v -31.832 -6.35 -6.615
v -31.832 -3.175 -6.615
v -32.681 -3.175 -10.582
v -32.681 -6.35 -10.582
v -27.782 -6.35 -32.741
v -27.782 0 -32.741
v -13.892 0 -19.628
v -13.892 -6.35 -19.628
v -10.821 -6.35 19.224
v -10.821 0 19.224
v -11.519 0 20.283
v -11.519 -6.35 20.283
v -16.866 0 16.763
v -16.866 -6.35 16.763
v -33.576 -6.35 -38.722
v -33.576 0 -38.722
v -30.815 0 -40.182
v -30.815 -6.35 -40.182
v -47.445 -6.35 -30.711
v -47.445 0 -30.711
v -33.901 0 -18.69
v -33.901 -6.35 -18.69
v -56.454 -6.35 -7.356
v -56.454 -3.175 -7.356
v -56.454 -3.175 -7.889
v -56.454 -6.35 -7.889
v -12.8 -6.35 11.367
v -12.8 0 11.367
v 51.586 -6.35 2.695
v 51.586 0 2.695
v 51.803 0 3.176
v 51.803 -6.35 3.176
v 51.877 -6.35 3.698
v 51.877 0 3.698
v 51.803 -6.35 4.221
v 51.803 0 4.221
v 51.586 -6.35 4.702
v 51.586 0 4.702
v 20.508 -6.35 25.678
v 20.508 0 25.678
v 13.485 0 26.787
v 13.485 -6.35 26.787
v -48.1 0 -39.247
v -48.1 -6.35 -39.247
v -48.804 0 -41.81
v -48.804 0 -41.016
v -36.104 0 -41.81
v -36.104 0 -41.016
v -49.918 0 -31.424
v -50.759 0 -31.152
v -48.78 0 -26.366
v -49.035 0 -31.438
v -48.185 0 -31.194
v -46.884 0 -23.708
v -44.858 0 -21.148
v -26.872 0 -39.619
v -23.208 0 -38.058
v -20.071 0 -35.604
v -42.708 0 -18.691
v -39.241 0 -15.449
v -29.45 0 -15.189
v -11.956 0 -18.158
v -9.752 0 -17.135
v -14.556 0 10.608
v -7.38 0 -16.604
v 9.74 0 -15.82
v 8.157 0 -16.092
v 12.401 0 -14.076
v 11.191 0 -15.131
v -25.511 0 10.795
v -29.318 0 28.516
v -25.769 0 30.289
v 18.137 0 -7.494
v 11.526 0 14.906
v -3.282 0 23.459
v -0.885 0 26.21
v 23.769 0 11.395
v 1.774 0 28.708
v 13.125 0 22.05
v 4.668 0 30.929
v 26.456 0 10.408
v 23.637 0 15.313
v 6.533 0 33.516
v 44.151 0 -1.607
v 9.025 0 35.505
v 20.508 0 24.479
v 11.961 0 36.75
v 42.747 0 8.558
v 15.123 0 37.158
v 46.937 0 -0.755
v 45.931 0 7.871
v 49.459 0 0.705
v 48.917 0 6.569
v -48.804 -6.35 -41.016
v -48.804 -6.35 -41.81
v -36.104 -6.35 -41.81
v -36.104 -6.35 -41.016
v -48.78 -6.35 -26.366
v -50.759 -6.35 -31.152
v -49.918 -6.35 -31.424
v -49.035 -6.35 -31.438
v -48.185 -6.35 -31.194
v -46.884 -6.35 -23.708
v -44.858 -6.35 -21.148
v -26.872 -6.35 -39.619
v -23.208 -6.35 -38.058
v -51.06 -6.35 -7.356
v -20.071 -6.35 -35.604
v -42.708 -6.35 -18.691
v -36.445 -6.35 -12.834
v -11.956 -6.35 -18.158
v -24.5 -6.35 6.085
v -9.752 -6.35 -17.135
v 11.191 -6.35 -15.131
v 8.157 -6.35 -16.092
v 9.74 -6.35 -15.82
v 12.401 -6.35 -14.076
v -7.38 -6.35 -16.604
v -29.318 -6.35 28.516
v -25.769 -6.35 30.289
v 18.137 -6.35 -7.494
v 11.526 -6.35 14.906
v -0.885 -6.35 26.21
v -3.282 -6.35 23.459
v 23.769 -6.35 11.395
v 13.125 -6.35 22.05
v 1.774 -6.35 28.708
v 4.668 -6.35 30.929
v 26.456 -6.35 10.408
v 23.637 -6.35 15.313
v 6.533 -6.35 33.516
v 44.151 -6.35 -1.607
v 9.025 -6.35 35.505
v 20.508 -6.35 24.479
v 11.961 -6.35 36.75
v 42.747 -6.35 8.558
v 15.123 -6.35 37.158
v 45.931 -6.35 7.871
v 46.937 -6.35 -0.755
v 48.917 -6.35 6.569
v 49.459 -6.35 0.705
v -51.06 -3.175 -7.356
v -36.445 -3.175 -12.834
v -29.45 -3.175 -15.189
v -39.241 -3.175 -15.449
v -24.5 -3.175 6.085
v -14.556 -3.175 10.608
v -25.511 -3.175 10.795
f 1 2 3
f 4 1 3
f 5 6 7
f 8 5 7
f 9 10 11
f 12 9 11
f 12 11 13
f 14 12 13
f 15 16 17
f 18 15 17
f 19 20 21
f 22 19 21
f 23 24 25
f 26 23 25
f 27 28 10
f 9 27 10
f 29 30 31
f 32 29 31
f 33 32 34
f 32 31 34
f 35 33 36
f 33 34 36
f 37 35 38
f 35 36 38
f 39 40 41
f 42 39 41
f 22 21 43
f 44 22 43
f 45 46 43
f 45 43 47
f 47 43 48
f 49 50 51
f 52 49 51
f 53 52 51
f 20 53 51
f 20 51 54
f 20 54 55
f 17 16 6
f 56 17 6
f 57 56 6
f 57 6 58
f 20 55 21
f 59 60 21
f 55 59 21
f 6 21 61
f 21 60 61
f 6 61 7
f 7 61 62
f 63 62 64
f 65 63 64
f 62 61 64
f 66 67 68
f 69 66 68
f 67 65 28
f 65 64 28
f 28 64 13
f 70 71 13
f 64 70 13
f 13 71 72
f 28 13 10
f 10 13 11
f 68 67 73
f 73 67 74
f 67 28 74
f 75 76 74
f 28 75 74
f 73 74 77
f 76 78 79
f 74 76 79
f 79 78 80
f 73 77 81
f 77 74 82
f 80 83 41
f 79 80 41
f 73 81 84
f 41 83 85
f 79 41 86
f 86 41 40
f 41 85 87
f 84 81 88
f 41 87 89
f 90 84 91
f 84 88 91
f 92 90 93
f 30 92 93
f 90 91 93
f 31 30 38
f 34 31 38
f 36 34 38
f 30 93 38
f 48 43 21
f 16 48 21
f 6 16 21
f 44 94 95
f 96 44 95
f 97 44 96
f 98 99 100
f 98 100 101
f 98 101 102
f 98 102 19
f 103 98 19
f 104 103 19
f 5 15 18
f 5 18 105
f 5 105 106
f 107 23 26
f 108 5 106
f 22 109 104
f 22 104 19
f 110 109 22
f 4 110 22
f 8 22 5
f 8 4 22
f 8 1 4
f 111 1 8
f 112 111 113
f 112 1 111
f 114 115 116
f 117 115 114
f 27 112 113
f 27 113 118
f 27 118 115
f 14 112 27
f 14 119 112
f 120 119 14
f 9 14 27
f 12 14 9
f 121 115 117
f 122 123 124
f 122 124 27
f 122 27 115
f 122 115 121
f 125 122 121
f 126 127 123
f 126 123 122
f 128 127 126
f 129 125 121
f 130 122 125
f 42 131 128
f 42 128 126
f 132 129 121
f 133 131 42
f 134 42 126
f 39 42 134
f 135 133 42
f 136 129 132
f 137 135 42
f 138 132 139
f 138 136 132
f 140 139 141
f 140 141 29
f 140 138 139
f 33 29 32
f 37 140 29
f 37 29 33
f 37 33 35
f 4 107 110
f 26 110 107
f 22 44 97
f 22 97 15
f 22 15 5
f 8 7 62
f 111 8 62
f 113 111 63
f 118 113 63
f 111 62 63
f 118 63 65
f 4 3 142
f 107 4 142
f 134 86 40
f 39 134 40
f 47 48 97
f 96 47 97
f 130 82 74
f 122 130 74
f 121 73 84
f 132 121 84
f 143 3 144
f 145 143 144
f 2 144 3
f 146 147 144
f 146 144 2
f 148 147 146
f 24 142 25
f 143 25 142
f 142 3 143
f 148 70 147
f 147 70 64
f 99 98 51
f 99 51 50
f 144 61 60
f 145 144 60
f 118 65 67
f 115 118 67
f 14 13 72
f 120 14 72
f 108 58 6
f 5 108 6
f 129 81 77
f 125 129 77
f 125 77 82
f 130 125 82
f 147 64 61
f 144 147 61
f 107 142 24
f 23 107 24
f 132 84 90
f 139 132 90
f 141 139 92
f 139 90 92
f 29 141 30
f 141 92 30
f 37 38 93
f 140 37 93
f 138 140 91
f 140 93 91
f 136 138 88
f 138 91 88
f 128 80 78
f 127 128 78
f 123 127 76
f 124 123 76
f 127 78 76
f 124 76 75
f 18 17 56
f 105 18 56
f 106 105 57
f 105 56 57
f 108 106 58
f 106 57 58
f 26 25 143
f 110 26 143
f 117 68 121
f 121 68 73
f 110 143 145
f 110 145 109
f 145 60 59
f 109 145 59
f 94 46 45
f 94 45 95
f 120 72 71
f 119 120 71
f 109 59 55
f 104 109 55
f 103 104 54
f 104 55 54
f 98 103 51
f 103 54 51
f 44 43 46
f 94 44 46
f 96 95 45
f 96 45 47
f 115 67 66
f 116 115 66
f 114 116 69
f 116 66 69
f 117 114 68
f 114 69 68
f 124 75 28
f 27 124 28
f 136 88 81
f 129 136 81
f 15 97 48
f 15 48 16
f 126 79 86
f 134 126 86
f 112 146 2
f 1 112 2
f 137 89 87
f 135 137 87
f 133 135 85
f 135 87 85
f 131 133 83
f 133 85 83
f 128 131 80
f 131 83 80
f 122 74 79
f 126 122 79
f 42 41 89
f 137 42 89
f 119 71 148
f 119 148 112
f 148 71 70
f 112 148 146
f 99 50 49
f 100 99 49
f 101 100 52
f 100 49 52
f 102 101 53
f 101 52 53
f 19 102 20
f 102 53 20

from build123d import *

# Parameters (mm, degrees)
F1_DEPTH = 6.35
F3_DEPTH = 6.351
F5_DEPTH = 3.175
F6_W     = 12.7
F6_H     = 6.35
F7_DEPTH = 0.79375


with BuildPart() as f1:
    # F0 (on Front) → F1 (new body)
    with BuildSketch(Plane.XZ):
        with BuildLine():
            Line((-24.499685, 6.084885), (-31.832033, -6.615115))
            Line((-31.832033, -6.615115), (-32.680925, -10.581826))
            Line((-32.680925, -10.581826), (-51.059928, -7.35622))
            Line((-51.059928, -7.35622), (-56.454085, -7.35622))
            Line((-56.454085, -7.35622), (-56.454085, -7.889269))
            Line((-56.454085, -7.889269), (-36.444739, -12.834284))
            Line((-36.444739, -12.834284), (-42.707812, -18.690551))
            ThreePointArc((-42.707812, -18.690551), (-45.886659, -22.415252), (-48.779547, -26.366159))
            Line((-48.779547, -26.366159), (-50.759438, -31.151975))
            ThreePointArc((-50.759438, -31.151975), (-49.034652, -31.438473), (-47.444712, -30.711107))
            Line((-47.444712, -30.711107), (-33.90066, -18.69024))
            Line((-33.90066, -18.69024), (-48.100285, -39.247155))
            Line((-48.100285, -39.247155), (-52.266728, -49.726259))
            Line((-52.266728, -49.726259), (-49.289104, -51.483847))
            ThreePointArc((-49.289104, -51.483847), (-47.937249, -51.364421), (-46.760015, -50.68922))
            Line((-46.760015, -50.68922), (-33.575531, -38.721569))
            Line((-33.575531, -38.721569), (-30.814609, -40.181708))
            ThreePointArc((-30.814609, -40.181708), (-24.988749, -38.958576), (-20.071417, -35.603501))
            Line((-20.071417, -35.603501), (-27.781654, -32.740546))
            Line((-27.781654, -32.740546), (-13.891757, -19.627586))
            ThreePointArc((-13.891757, -19.627586), (-10.881214, -17.587078), (-7.379708, -16.603975))
            Line((-7.379708, -16.603975), (8.157321, -16.091641))
            ThreePointArc((8.157321, -16.091641), (10.488998, -15.52545), (12.401008, -14.075792))
            Line((12.401008, -14.075792), (18.136641, -7.494206))
            Line((18.136641, -7.494206), (44.15147, -1.607402))
            ThreePointArc((44.15147, -1.607402), (48.239493, -0.096798), (51.586218, 2.694848))
            ThreePointArc((51.586218, 2.694848), (51.877375, 3.698296), (51.586218, 4.701744))
            ThreePointArc((51.586218, 4.701744), (47.456215, 7.294304), (42.746603, 8.558366))
            Line((42.746603, 8.558366), (26.455848, 10.407886))
            Line((26.455848, 10.407886), (23.768522, 11.395085))
            Line((23.768522, 11.395085), (23.636915, 15.313192))
            Line((23.636915, 15.313192), (11.526386, 14.906407))
            Line((11.526386, 14.906407), (13.124879, 22.049895))
            Line((13.124879, 22.049895), (20.507815, 24.478994))
            Line((20.507815, 24.478994), (20.507815, 25.678071))
            Line((20.507815, 25.678071), (13.484901, 26.78713))
            Line((13.484901, 26.78713), (15.122742, 37.158459))
            ThreePointArc((15.122742, 37.158459), (9.02504, 35.504795), (4.668364, 30.929212))
            ThreePointArc((4.668364, 30.929212), (0.413088, 27.492182), (-3.282097, 23.459049))
            Line((-3.282097, 23.459049), (-12.800315, 11.367148))
            Line((-12.800315, 11.367148), (-10.821415, 19.223839))
            Line((-10.821415, 19.223839), (-11.518751, 20.283149))
            Line((-11.518751, 20.283149), (-16.865773, 16.763244))
            Line((-16.865773, 16.763244), (-25.769467, 30.28868))
            Line((-25.769467, 30.28868), (-29.317735, 28.515689))
            Line((-29.317735, 28.515689), (-24.499685, 6.084885))
        make_face()
    extrude(amount=F1_DEPTH)

    # F2 (on face) → F3 (cut, through all)
    with BuildSketch(Plane.XZ.offset(6.35)):
        Polygon((-36.103749, -51.509792), (-36.103749, -41.01645), (-48.803749, -41.01645), (-61.503749, -41.01645), (-61.503749, -51.509792), align=None)
    extrude(amount=-F3_DEPTH, mode=Mode.SUBTRACT)

    # F4 (on face) → F5 (cut)
    with BuildSketch(Plane(origin=(0, 0, 0), x_dir=(-1, 0, 0), z_dir=(0, 1, 0))):
        Polygon((56.454085, 11.32442), (14.556029, 10.607801), (29.449862, -15.189074), (56.454085, -15.905692), align=None)
    extrude(amount=-F5_DEPTH, mode=Mode.SUBTRACT)

    # F6 (on face) → F7 (join)
    with BuildSketch(Plane(origin=(0, 0, -41.01645), x_dir=(1, 0, 0), z_dir=(0, 0, -1))):
        with Locations((-42.453749, 3.175)):
            Rectangle(F6_W, F6_H)
    extrude(amount=F7_DEPTH)


solid = f1.part
